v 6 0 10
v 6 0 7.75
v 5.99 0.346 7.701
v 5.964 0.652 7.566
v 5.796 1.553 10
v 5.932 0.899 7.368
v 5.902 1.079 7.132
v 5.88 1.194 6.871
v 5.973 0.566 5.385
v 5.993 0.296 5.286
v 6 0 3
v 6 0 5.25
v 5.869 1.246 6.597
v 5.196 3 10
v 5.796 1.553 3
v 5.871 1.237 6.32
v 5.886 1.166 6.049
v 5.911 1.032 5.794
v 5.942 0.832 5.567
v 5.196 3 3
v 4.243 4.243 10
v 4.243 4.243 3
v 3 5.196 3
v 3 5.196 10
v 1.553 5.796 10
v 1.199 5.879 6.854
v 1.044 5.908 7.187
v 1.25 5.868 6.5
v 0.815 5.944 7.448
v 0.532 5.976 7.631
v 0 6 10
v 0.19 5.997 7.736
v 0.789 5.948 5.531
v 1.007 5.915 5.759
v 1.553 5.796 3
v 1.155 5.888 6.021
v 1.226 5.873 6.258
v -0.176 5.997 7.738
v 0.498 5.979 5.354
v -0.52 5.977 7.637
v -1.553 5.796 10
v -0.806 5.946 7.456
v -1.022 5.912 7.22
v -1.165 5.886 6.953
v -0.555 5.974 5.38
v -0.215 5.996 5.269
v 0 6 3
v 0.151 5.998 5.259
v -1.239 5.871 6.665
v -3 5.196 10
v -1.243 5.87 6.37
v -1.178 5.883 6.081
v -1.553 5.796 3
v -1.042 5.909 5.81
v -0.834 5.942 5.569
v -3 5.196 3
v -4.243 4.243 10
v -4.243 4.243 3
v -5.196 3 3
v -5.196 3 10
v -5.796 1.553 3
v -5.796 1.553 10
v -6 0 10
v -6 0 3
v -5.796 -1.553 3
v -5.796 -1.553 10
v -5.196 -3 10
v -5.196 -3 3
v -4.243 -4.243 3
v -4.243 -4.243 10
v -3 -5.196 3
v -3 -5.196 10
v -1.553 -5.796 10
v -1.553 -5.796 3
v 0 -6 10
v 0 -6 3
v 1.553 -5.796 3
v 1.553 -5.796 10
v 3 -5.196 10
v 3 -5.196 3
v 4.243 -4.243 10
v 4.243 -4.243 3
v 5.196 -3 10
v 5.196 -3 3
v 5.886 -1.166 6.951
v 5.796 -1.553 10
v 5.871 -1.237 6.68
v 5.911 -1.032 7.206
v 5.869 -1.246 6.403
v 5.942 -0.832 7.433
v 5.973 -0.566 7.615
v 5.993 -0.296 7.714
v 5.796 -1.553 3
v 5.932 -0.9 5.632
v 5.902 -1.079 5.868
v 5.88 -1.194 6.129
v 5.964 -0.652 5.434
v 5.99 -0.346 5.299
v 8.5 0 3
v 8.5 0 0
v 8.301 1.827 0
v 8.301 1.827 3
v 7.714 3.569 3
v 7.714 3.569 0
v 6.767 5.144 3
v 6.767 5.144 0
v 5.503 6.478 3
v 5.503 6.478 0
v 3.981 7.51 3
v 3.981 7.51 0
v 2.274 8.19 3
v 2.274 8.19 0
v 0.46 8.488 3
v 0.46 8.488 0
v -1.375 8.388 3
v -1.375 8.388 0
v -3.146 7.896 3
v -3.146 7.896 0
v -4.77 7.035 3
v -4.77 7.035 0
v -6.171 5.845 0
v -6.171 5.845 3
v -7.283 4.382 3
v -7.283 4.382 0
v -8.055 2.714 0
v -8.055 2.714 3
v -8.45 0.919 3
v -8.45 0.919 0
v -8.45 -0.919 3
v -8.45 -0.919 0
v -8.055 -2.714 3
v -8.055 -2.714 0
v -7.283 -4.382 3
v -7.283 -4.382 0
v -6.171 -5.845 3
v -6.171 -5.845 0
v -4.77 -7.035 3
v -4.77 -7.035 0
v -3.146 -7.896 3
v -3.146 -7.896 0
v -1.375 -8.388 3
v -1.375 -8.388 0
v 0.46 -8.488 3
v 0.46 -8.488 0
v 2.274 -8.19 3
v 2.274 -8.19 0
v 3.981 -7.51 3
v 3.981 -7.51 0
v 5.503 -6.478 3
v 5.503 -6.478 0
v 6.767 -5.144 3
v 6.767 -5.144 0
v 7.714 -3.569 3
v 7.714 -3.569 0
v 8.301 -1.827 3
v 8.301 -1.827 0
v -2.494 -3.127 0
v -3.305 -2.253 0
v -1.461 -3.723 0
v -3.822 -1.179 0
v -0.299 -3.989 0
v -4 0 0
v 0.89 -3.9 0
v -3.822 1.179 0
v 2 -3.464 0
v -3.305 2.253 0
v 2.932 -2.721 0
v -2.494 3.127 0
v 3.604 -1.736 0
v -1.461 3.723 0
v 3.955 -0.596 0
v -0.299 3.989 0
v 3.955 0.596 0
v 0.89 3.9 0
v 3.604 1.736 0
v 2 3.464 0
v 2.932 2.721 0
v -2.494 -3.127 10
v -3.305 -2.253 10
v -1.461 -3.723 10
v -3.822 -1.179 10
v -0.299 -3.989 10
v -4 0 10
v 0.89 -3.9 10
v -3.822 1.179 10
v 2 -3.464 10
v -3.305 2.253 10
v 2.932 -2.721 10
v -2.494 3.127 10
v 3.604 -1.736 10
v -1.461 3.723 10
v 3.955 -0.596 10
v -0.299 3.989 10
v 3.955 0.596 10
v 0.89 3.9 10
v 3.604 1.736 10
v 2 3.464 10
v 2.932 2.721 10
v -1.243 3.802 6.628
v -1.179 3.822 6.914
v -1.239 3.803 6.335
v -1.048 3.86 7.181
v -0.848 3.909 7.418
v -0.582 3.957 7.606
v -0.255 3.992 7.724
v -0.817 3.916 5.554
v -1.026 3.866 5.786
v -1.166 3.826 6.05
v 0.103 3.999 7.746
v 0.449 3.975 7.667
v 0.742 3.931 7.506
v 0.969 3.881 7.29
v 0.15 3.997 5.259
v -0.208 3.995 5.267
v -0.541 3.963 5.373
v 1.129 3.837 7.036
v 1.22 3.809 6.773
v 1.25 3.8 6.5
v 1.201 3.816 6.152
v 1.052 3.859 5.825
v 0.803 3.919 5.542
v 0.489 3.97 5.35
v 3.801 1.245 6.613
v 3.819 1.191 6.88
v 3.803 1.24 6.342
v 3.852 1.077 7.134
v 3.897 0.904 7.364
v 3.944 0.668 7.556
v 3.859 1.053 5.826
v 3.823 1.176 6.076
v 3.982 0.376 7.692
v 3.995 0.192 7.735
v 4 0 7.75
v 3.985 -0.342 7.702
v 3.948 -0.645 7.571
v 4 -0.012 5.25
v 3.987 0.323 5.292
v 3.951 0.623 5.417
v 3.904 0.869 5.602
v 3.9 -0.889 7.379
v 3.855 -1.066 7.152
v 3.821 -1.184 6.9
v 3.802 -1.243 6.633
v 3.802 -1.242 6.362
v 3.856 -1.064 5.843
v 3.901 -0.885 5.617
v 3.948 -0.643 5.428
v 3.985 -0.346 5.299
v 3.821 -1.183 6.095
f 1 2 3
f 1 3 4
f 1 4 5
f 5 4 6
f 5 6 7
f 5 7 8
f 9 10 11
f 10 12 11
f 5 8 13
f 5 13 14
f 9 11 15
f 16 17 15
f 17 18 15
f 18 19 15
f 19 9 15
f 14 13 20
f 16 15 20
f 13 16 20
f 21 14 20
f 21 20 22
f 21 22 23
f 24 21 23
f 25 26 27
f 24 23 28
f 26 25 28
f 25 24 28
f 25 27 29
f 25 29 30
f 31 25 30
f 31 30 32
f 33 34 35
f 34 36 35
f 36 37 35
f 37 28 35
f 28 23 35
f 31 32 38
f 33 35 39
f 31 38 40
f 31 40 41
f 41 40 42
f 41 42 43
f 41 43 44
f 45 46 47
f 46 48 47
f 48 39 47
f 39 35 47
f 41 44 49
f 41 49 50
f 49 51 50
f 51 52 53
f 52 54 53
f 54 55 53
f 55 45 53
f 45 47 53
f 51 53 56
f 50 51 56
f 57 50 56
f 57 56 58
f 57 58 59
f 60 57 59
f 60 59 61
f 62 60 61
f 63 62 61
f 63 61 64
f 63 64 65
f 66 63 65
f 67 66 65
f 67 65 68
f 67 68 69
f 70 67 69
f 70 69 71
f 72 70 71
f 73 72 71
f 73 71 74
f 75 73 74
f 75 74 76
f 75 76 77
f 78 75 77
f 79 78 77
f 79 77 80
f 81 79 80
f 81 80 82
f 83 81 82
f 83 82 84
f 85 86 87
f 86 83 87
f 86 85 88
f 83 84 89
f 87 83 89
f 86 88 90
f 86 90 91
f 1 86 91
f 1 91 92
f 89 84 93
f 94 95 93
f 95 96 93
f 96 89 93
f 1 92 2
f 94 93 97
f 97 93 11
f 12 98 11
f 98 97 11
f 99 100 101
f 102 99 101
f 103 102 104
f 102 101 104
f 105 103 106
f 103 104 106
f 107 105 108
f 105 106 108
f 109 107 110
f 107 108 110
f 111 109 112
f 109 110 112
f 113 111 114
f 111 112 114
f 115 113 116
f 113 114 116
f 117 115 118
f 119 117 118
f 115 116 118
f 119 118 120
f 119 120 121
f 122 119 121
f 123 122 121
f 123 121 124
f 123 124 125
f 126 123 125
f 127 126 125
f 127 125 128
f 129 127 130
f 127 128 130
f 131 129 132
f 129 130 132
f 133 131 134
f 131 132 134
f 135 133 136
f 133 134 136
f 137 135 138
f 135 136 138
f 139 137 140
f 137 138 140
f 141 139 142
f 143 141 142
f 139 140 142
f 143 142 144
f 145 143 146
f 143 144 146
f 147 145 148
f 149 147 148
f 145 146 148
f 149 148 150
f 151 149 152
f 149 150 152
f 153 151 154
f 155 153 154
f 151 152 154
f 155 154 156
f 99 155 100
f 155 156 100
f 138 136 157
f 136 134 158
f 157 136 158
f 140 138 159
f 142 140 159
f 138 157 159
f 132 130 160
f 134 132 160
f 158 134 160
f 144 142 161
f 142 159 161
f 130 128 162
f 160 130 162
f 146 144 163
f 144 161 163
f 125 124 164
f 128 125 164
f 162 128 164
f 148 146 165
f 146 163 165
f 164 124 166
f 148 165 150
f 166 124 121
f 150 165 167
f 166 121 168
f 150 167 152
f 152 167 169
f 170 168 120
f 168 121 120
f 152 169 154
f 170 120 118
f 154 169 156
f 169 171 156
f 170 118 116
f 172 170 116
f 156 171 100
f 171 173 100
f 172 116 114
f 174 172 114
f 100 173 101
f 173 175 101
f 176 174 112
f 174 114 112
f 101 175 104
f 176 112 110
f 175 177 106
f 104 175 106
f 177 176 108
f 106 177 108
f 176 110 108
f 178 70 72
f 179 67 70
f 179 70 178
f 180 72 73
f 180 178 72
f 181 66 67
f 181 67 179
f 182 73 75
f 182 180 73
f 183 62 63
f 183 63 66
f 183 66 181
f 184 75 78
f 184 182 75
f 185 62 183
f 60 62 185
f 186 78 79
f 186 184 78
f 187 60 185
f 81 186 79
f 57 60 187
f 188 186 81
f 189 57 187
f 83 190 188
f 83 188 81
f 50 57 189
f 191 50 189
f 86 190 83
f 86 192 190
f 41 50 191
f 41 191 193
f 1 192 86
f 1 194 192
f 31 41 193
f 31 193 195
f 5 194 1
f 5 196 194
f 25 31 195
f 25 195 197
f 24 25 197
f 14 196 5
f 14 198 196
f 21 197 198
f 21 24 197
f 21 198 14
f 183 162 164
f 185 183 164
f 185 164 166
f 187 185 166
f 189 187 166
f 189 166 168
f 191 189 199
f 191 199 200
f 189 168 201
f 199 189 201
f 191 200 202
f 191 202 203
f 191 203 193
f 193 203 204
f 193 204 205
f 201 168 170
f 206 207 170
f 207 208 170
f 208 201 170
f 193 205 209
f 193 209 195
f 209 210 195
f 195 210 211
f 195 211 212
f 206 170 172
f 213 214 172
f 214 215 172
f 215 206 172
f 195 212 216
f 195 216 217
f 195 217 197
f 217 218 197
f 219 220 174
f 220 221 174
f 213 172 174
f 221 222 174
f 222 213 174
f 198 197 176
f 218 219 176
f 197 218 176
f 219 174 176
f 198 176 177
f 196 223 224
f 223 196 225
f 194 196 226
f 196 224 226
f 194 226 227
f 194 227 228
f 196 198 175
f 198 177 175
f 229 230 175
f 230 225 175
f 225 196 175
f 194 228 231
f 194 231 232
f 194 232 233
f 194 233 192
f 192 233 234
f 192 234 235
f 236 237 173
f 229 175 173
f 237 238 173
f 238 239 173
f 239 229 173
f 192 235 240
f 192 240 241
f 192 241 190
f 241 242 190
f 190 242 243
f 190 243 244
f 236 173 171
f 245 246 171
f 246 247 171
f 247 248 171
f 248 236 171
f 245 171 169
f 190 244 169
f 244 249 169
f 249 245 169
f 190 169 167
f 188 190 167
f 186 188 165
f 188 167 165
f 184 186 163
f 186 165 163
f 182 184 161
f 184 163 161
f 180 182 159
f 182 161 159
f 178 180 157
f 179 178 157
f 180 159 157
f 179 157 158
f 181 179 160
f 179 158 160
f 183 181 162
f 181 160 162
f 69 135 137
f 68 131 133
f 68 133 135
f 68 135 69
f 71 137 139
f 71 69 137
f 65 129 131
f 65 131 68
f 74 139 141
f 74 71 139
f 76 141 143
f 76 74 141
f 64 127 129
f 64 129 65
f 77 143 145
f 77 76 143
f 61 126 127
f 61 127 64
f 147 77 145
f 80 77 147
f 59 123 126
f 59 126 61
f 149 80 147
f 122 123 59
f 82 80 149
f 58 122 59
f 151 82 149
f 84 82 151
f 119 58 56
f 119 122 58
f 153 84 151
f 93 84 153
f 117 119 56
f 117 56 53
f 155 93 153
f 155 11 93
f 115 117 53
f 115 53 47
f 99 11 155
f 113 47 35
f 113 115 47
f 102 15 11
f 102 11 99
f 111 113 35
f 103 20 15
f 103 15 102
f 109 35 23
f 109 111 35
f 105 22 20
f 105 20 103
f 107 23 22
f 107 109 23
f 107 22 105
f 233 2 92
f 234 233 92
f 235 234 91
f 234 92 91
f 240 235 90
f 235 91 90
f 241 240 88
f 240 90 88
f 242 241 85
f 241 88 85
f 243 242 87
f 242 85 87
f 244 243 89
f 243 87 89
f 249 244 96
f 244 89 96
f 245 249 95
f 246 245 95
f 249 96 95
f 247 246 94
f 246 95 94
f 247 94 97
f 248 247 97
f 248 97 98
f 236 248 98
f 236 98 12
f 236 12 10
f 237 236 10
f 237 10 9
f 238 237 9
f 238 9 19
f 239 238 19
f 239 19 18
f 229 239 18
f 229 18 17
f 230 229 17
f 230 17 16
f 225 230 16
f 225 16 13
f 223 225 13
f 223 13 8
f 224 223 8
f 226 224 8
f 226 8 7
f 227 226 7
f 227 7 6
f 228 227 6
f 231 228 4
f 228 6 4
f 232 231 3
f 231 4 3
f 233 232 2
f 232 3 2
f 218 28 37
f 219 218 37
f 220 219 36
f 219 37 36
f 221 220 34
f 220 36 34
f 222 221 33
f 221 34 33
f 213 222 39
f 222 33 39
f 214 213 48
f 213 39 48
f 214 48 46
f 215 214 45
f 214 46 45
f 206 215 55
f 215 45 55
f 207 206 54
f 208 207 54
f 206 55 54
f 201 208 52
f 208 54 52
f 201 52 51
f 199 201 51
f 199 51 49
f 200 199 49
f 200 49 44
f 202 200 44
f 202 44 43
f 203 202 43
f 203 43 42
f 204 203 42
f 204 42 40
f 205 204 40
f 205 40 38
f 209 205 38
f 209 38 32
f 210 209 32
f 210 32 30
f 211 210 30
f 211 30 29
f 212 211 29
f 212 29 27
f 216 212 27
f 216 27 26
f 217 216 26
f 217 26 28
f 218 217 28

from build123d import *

# Parameters (mm, degrees)
SKETCH_1_R                       = 8.5
EXTRUDE_1_DEPTH                  = 3
SKETCH_2_R                       = 6
EXTRUDE_2_DEPTH                  = 7
CUT_EXTRUDE_1_REACH              = 17.636
SKETCH_3_R                       = 4
HOLE_WIZARD_M3_1_REACH           = 20.021
HOLE_WIZARD_M3_1_BORE_R          = 1.25
HOLE_WIZARD_M3_1_ON_FACE_2_REACH = 20.021
HOLE_WIZARD_M3_1_BORE_2_R        = 1.25


with BuildPart() as part:
    # 스케치1 → 보스-돌출1 (new body)
    with BuildSketch(Plane.XY):
        Circle(SKETCH_1_R)
    extrude(amount=EXTRUDE_1_DEPTH)

    # 스케치2 → 보스-돌출2 (add)
    with BuildSketch(Plane.XY.offset(3)):
        Circle(SKETCH_2_R)
    extrude(amount=EXTRUDE_2_DEPTH)

    # 스케치3 → 컷-돌출1 (cut, up to next)
    with BuildSketch(Plane(origin=(0, 0, 0), x_dir=(-1, 0, 0), z_dir=(0, 0, -1)), mode=Mode.PRIVATE) as cut_extrude_1_sk1:
        Circle(SKETCH_3_R)
    cut_extrude_1_tool1 = extrude(cut_extrude_1_sk1.sketch, amount=-CUT_EXTRUDE_1_REACH, mode=Mode.PRIVATE) & part.part
    add(cut_extrude_1_tool1.solids().sort_by_distance((0, 0, 0))[0], mode=Mode.SUBTRACT)

    # M3 나사 구멍1 bore (on position points) → M3 나사 구멍1 (cut, up to next)
    with BuildSketch(Plane(origin=(0, 6, 6.5), x_dir=(1, 0, 0), z_dir=(0, 1, 0)), mode=Mode.PRIVATE) as hole_wizard_m3_1_sk1:
        Circle(HOLE_WIZARD_M3_1_BORE_R)
    hole_wizard_m3_1_tool1 = extrude(hole_wizard_m3_1_sk1.sketch, amount=-HOLE_WIZARD_M3_1_REACH, mode=Mode.PRIVATE) & part.part
    add(hole_wizard_m3_1_tool1.solids().sort_by_distance((0, 6, 6.5))[0], mode=Mode.SUBTRACT)

    # M3 나사 구멍1 bore 2 (on position points) → M3 나사 구멍1 on face 2 (cut, up to next)
    with BuildSketch(Plane(origin=(6, 0, 6.5), x_dir=(0, 0, 1), z_dir=(1, 0, 0)), mode=Mode.PRIVATE) as hole_wizard_m3_1_on_face_2_sk1:
        Circle(HOLE_WIZARD_M3_1_BORE_2_R)
    hole_wizard_m3_1_on_face_2_tool1 = extrude(hole_wizard_m3_1_on_face_2_sk1.sketch, amount=-HOLE_WIZARD_M3_1_ON_FACE_2_REACH, mode=Mode.PRIVATE) & part.part
    add(hole_wizard_m3_1_on_face_2_tool1.solids().sort_by_distance((6, 0, 6.5))[0], mode=Mode.SUBTRACT)


solid = part.part
